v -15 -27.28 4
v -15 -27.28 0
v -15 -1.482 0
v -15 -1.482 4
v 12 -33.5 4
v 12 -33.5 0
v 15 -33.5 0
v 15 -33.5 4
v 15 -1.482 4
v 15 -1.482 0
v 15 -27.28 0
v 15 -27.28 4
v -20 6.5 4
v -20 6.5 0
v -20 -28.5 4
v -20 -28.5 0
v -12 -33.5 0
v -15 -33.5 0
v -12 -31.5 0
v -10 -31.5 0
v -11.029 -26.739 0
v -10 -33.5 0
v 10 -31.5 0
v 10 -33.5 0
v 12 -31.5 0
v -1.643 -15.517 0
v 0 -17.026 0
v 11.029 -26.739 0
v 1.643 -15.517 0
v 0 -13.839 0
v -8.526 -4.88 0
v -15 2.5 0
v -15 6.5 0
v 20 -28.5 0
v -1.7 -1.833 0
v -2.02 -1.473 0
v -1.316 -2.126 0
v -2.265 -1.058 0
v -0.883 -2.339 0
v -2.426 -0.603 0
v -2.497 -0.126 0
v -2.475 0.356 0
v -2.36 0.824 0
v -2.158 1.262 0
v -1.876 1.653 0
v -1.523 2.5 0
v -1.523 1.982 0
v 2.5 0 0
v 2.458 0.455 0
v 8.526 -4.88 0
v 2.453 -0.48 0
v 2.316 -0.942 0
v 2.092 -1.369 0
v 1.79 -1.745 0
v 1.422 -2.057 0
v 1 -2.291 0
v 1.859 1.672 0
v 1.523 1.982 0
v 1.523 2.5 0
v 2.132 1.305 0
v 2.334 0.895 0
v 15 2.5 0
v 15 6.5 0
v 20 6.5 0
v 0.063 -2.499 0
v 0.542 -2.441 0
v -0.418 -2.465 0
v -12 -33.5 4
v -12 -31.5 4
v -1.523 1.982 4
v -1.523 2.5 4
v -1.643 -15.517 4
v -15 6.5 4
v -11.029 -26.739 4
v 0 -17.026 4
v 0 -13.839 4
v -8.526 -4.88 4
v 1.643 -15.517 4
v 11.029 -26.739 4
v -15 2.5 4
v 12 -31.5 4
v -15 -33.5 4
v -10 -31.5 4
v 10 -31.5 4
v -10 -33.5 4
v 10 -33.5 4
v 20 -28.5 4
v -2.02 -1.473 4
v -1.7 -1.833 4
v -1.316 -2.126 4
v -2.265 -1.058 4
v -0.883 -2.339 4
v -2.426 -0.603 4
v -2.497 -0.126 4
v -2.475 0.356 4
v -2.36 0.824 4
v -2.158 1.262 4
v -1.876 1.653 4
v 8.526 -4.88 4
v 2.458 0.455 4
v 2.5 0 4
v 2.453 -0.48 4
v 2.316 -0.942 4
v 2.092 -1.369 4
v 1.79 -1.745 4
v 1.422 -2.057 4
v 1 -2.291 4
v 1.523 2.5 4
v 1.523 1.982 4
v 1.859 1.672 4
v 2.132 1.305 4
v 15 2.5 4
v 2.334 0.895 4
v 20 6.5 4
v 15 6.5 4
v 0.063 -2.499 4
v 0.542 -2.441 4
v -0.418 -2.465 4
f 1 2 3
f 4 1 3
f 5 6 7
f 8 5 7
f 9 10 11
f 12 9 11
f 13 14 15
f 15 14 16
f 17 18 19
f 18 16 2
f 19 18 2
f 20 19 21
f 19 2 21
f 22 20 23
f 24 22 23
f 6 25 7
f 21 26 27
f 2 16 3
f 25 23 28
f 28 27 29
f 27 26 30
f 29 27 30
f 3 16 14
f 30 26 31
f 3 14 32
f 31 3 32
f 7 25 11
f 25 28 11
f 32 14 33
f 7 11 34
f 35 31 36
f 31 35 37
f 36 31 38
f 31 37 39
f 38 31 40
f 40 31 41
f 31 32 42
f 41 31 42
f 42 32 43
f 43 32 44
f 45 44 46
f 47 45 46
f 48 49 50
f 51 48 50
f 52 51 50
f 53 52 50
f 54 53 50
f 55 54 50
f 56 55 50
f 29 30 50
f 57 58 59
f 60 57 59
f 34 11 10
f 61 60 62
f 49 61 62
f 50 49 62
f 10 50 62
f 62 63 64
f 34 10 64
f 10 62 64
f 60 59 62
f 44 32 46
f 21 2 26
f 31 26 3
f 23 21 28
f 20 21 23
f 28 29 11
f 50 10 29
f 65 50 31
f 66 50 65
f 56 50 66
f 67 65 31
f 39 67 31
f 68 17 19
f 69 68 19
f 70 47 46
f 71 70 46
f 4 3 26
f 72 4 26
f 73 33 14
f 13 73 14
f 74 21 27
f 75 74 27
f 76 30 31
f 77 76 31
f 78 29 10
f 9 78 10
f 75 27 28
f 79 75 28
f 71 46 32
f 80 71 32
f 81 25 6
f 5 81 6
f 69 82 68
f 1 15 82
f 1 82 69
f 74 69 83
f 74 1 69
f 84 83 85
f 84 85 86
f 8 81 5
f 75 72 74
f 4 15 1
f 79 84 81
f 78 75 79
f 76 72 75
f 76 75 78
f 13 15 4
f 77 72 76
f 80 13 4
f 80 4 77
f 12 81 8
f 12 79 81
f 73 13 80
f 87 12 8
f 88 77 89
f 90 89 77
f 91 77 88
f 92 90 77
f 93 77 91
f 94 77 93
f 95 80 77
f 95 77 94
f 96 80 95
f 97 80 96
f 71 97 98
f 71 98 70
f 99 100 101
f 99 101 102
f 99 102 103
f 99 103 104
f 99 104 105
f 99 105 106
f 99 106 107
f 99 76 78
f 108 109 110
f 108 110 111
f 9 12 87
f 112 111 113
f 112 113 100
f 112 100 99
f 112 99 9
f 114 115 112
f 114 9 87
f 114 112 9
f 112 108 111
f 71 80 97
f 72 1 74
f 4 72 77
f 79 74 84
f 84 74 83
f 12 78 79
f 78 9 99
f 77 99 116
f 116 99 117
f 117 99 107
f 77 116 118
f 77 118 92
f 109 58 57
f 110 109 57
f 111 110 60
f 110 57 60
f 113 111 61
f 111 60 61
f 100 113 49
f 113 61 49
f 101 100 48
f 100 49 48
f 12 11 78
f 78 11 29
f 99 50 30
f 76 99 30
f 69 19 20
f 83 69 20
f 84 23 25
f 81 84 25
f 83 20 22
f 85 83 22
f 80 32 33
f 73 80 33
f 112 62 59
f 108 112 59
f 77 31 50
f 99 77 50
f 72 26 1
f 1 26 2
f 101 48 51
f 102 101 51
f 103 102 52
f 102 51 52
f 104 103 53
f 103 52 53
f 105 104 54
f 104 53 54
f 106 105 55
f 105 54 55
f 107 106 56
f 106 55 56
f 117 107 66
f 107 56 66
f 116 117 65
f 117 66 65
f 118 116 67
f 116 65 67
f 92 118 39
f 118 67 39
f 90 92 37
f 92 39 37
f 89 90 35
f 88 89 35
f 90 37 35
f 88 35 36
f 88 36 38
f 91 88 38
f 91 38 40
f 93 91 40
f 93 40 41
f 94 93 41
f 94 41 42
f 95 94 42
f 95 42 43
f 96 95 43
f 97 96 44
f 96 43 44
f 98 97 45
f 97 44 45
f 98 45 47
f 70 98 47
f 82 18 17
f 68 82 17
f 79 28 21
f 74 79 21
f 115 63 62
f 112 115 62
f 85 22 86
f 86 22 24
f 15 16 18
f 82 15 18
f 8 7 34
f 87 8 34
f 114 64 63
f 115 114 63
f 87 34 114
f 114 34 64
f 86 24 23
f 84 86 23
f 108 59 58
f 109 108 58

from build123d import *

# Parameters (mm, degrees)
EXTRUDE_3_DEPTH = 4


with BuildPart() as part:
    # ｽｹｯﾁ1 → ﾎﾞｽ - 押し出し3 (new body)
    with BuildSketch(Plane.XY):
        with BuildLine():
            Line((15, 6.5), (15, 2.5))
            Line((15, 2.5), (1.523471671, 2.5))
            Line((1.523471671, 2.5), (1.523471671, 1.982179121))
            ThreePointArc((1.523471671, 1.982179121), (2.242618913, 1.104835015), (2.5, 0))
            ThreePointArc((2.5, 0), (-1.104835015, -2.242618913), (-1.523471671, 1.982179121))
            Line((-1.523471671, 1.982179121), (-1.523471671, 2.5))
            Line((-1.523471671, 2.5), (-15, 2.5))
            Line((-15, 2.5), (-15, 6.5))
            Line((-15, 6.5), (-20, 6.5))
            Line((-20, 6.5), (-20, -28.5))
            Line((-20, -28.5), (-15, -33.5))
            Line((-15, -33.5), (-12, -33.5))
            Line((-12, -33.5), (-12, -31.5))
            Line((-12, -31.5), (-10, -31.5))
            Line((-10, -31.5), (-10, -33.5))
            Line((-10, -33.5), (0, -33.5))
            Line((0, -33.5), (10, -33.5))
            Line((10, -33.5), (10, -31.5))
            Line((10, -31.5), (12, -31.5))
            Line((12, -31.5), (12, -33.5))
            Line((12, -33.5), (15, -33.5))
            Line((15, -33.5), (20, -28.5))
            Line((20, -28.5), (20, 6.5))
            Line((20, 6.5), (15, 6.5))
        make_face()
        Polygon((-15, -27.27974657), (-15, -1.481890402), (-1.643206603, -15.516883287), align=None, mode=Mode.SUBTRACT)
        Polygon((-11.029061917, -26.739072938), (0, -17.026161792), (11.029061917, -26.739072938), align=None, mode=Mode.SUBTRACT)
        Polygon((15, -27.27974657), (1.643206603, -15.516883287), (15, -1.481890402), align=None, mode=Mode.SUBTRACT)
        Polygon((-8.526128996, -4.880410376), (8.526128996, -4.880410376), (0, -13.839458872), align=None, mode=Mode.SUBTRACT)
    extrude(amount=EXTRUDE_3_DEPTH)


solid = part.part
